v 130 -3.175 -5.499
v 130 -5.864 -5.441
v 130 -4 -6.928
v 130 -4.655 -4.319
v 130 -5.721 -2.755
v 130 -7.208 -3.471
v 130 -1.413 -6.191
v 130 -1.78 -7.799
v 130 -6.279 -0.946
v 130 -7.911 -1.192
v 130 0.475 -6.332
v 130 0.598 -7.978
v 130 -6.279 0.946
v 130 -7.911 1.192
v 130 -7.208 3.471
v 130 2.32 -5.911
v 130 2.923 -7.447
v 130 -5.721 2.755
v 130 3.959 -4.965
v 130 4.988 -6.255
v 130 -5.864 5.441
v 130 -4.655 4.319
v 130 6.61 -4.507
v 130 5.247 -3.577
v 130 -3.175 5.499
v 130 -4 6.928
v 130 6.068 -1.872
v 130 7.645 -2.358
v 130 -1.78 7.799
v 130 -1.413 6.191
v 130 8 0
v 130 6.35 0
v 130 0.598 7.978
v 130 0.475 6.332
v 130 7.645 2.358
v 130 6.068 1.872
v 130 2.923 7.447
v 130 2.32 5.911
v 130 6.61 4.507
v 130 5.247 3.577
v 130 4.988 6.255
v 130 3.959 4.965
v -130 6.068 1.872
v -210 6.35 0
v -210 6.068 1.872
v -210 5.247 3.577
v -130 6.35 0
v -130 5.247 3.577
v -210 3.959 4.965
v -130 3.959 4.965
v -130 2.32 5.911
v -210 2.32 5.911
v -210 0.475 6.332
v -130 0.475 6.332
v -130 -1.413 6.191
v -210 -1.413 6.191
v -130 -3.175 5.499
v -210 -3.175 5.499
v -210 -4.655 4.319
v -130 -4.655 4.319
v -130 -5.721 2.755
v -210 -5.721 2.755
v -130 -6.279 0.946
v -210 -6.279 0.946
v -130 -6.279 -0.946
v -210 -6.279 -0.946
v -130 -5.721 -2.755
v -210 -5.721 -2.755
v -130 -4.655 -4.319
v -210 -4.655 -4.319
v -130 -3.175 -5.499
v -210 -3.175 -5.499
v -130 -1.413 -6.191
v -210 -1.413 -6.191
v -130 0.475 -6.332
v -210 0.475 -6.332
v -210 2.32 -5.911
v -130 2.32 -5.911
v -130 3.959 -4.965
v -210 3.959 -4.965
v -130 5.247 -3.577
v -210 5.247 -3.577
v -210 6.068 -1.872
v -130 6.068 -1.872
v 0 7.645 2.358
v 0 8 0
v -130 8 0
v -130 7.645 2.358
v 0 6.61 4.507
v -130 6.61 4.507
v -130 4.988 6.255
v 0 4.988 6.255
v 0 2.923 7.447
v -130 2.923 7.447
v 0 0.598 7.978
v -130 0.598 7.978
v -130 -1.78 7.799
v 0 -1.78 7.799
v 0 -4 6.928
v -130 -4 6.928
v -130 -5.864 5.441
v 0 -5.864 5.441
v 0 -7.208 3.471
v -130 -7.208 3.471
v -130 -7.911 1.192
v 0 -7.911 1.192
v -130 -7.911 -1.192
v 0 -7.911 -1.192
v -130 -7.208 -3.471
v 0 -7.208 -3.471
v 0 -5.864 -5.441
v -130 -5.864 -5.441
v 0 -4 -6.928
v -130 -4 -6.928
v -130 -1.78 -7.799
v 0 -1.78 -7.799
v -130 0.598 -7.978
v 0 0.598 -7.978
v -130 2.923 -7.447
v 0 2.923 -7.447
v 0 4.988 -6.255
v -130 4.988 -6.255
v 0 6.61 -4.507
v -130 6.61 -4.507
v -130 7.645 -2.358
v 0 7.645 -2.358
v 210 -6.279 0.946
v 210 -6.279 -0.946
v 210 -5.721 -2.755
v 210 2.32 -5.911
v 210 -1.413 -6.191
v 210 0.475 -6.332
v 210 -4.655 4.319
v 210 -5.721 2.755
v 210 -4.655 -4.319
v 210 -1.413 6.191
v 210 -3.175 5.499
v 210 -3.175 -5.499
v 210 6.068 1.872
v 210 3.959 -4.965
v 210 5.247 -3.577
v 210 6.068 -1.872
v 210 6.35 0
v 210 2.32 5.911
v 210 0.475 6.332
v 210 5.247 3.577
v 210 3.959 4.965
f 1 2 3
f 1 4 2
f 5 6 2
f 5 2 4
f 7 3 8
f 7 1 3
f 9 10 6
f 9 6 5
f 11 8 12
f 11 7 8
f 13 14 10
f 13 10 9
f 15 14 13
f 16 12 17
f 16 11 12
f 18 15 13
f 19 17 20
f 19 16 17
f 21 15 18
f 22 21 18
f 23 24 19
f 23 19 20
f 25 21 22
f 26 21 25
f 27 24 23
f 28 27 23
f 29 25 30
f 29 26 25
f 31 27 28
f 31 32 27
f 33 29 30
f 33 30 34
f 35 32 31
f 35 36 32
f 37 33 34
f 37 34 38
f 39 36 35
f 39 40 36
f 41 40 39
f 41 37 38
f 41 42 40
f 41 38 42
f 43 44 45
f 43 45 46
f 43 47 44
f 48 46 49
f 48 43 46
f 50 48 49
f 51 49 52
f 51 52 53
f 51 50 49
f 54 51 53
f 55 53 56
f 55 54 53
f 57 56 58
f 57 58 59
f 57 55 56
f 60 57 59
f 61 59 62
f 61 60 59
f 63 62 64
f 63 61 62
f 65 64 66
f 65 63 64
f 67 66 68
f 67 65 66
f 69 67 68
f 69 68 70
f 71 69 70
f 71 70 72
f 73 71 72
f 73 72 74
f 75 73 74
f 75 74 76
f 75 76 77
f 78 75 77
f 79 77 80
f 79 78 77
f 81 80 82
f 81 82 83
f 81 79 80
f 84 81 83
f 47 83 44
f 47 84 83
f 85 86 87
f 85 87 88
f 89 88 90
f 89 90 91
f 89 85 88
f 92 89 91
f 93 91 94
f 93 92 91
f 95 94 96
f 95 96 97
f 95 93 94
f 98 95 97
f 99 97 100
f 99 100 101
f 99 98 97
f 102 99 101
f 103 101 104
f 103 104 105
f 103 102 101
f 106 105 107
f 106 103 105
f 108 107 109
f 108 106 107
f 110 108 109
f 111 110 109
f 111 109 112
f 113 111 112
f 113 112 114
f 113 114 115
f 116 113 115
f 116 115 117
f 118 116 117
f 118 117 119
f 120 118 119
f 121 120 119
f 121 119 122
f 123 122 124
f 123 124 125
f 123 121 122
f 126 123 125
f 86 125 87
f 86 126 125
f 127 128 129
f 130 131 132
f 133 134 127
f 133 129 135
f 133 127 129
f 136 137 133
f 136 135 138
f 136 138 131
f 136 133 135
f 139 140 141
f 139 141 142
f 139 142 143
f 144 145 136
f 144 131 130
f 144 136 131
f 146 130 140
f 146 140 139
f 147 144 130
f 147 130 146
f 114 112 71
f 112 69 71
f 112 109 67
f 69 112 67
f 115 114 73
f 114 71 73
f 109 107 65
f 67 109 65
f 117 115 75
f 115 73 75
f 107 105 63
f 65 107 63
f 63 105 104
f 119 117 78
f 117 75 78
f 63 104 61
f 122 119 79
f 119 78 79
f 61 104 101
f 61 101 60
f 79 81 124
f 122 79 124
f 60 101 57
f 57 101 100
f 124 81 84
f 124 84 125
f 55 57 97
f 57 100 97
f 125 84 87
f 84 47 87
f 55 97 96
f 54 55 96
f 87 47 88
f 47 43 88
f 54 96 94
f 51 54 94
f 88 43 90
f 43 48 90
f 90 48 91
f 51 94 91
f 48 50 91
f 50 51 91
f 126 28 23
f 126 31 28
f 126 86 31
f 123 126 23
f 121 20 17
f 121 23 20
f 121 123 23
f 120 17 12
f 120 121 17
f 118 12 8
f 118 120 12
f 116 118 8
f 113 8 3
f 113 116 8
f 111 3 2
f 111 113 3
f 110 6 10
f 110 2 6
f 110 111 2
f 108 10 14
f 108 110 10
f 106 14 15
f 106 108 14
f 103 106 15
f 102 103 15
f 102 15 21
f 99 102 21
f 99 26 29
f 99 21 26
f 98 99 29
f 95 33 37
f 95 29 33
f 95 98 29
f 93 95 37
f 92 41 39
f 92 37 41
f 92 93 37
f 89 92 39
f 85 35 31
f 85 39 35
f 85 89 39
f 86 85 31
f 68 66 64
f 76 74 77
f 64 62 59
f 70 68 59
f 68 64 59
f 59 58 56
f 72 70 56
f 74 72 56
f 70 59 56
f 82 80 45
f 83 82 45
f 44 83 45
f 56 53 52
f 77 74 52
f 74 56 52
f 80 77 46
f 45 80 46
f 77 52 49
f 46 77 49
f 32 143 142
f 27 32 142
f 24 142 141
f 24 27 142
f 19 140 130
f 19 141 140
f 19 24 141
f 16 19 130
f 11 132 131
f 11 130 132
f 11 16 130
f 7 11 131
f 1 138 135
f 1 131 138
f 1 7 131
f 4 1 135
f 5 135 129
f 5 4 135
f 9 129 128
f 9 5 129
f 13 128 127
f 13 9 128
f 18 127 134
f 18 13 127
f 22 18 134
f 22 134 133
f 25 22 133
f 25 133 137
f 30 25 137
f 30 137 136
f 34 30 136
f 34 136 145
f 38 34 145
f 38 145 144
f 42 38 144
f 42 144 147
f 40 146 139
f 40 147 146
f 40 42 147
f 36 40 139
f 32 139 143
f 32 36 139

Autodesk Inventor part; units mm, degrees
ref_plane "YZ Plane" through (0, 0, 0) normal (1, 0, 0) x (0, 1, 0)
ref_plane "XZ Plane" through (0, 0, 0) normal (0, 1, 0) x (-1, 0, 0)
ref_plane "XY Plane" through (0, 0, 0) normal (0, 0, 1) x (1, 0, 0)
sketch "Sketch1" plane through (0, 0, 0) normal (1, 0, 0) x (0, 1, 0)
  circle A0 centre (0, 0) radius 8
  circle A1 centre (0, 0) radius 6.35
  dimension "d0" = 16
  dimension "d3" = 12.7
extrude "Extrusion1" add sketch "Sketch1" along normal mid plane 420 contours A1
extrude "Extrusion2" add sketch "Sketch1" along normal mid plane 260
thread "Thread1" size "M16x2" class "6g" standard "ANSI Metric M Profile" full length
properties part number "driveshaft1"
